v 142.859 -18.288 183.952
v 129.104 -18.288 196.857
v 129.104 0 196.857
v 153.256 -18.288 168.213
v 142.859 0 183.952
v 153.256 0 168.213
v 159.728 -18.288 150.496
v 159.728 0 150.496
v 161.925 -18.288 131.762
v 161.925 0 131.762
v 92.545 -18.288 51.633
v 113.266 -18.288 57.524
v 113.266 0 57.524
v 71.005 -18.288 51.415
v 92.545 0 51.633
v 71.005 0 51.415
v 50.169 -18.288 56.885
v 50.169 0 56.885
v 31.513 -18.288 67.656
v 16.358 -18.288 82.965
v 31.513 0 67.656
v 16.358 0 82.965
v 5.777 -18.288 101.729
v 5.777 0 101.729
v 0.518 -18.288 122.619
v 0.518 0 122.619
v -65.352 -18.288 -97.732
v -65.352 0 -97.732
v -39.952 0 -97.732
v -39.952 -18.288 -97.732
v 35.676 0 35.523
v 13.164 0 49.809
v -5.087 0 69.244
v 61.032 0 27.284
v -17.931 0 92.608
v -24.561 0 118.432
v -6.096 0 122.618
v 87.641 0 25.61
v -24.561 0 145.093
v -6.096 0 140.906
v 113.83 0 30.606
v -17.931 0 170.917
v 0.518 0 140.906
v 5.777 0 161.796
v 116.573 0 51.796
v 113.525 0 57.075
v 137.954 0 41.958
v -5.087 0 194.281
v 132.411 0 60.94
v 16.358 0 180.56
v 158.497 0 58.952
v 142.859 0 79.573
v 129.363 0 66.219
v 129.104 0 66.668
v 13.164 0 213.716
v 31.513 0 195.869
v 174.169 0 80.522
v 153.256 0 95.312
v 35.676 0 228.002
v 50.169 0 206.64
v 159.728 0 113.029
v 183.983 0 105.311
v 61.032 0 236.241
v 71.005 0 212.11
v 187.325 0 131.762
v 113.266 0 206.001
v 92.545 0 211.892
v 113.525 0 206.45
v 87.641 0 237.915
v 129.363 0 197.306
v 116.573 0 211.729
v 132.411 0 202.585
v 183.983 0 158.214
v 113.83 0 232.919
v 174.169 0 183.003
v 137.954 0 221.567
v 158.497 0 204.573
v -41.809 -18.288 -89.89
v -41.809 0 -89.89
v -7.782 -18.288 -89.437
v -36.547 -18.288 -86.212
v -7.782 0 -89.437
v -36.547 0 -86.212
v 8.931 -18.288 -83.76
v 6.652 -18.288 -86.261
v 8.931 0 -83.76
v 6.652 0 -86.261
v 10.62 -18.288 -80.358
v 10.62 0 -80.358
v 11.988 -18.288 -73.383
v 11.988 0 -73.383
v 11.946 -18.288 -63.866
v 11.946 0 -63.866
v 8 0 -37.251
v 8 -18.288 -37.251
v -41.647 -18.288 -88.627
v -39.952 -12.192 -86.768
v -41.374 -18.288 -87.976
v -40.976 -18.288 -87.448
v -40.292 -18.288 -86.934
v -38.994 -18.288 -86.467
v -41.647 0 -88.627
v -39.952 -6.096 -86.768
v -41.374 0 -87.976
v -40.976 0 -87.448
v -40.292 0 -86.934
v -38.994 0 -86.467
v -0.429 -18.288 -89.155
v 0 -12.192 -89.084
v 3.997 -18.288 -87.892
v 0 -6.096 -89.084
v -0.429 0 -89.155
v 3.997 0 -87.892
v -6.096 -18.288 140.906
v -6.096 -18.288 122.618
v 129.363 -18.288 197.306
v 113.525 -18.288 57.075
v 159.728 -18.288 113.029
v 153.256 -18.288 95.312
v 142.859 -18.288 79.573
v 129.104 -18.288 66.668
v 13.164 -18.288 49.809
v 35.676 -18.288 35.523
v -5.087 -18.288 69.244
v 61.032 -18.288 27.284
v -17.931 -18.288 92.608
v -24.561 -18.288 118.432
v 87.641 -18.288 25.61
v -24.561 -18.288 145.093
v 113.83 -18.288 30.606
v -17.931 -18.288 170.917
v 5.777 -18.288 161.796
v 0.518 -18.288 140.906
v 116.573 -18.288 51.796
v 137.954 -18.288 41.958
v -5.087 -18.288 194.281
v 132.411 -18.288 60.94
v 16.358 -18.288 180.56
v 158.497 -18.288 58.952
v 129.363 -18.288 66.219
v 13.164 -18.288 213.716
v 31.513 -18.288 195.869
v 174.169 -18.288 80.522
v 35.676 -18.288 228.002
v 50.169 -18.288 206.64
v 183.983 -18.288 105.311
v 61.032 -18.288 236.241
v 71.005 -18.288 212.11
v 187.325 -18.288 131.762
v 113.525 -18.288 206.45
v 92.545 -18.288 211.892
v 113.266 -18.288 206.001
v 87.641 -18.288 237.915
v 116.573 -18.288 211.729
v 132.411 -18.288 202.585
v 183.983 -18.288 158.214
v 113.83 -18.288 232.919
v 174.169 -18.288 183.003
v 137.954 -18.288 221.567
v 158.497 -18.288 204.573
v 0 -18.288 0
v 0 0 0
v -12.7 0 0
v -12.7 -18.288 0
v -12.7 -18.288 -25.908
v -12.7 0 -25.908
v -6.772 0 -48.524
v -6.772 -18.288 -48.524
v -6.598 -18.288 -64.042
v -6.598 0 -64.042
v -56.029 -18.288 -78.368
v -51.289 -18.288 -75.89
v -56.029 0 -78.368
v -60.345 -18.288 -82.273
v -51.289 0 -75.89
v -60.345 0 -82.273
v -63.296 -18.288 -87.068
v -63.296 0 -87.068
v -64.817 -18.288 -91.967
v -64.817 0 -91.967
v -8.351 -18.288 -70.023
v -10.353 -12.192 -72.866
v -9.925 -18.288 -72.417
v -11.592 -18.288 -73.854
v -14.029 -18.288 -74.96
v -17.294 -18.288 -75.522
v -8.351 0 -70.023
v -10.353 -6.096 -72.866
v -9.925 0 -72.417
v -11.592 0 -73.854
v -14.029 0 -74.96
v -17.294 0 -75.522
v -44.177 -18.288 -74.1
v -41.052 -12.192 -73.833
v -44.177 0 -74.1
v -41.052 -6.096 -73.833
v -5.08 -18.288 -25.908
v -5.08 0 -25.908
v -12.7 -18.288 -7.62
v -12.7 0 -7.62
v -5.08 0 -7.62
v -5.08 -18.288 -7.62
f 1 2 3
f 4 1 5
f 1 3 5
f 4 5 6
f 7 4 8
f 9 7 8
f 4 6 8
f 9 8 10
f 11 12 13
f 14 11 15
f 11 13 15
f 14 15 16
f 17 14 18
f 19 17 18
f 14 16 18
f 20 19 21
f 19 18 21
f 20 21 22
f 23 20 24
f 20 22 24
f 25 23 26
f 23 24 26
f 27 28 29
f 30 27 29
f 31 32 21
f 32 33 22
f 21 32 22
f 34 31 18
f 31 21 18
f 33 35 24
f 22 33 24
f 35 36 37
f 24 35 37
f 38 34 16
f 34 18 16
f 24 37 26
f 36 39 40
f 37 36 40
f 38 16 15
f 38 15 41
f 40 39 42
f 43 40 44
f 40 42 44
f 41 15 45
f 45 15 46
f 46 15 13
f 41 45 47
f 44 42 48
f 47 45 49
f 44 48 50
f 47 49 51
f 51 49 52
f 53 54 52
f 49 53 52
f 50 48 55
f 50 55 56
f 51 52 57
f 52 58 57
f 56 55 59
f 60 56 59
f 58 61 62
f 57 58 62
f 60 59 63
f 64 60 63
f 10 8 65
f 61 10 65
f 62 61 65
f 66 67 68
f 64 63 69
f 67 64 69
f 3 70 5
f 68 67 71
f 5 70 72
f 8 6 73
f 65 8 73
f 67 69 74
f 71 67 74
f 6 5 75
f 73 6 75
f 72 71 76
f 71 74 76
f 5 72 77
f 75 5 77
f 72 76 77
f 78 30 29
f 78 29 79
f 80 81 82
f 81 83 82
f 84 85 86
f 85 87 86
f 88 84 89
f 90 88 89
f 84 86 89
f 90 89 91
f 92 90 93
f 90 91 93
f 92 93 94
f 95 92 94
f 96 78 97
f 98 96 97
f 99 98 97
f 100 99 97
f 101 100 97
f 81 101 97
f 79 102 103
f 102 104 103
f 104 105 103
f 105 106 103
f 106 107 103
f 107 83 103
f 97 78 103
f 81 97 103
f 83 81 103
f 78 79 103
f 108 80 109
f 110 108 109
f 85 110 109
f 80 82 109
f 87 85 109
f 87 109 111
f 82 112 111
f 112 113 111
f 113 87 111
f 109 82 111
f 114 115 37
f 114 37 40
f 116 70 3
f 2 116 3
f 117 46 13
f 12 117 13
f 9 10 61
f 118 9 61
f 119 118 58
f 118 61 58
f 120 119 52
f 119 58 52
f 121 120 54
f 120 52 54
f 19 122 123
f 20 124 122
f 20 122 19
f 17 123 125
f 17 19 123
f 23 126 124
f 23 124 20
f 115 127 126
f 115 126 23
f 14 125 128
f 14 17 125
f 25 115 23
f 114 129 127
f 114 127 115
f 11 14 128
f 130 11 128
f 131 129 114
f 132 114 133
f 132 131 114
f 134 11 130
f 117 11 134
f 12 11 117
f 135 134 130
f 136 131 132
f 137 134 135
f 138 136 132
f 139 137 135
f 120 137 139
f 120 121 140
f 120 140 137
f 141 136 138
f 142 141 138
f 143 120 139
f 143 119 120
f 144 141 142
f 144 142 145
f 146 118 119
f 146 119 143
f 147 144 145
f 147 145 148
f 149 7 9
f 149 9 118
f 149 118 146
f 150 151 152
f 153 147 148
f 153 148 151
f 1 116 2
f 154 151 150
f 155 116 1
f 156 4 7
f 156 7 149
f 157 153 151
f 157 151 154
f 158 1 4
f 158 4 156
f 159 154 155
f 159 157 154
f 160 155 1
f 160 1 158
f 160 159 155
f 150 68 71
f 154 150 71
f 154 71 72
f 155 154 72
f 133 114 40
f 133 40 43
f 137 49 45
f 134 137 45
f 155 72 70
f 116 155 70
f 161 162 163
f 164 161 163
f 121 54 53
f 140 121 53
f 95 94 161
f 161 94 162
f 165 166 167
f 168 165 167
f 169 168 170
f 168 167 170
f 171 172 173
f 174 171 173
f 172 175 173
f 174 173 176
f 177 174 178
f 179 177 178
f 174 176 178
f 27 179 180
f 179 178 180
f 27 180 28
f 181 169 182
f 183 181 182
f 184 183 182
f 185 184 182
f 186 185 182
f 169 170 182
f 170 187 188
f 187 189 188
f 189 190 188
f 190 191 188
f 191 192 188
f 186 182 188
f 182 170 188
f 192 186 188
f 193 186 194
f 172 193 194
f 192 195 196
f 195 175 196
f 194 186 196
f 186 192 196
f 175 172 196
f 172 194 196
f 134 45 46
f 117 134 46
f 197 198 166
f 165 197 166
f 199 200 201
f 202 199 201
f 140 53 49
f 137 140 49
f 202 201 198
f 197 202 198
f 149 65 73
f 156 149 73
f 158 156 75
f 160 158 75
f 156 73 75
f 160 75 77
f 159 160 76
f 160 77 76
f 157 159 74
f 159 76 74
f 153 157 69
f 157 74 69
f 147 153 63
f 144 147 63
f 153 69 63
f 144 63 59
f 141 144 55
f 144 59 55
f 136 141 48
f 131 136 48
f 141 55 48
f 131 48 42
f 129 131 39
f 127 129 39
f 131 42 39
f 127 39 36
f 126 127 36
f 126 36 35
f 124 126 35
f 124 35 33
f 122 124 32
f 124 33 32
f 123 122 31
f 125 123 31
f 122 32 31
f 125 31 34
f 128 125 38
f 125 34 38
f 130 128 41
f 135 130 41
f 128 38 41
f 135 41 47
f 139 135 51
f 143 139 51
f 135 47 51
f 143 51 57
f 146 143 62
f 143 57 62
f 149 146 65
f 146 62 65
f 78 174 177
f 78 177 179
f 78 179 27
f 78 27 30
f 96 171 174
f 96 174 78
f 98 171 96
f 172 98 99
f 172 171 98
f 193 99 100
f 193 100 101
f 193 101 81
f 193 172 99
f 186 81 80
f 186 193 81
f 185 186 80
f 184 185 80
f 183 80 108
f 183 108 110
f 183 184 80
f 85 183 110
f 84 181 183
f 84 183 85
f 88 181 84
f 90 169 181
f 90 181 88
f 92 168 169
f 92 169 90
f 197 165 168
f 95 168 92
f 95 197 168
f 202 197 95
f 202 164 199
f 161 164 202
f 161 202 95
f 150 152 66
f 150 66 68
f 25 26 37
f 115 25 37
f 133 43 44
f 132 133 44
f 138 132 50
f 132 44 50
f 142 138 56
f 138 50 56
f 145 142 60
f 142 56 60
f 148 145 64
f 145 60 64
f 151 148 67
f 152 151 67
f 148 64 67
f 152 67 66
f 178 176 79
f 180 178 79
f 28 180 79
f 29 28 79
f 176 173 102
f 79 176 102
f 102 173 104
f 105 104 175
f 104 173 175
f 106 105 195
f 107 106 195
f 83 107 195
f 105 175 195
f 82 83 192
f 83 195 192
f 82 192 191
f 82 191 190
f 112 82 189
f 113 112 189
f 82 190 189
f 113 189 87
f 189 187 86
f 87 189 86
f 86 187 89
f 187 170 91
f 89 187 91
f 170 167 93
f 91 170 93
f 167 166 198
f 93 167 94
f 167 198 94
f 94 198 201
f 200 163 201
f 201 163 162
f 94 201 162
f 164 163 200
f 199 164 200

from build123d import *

# Parameters (mm, degrees)
F0_R     = 106.3625
F1_DEPTH = 18.288


with BuildPart() as f1:
    # F0 (on Front) → F1 (new body)
    with BuildSketch(Plane.XZ):
        with Locations((80.9625, 131.7625)):
            Circle(F0_R)
        with BuildLine():
            ThreePointArc((129.103674141, 196.8574595482), (153.255501797, 168.2131282172), (161.925, 131.7625))
            ThreePointArc((161.925, 131.7625), (153.255501797, 95.3118717828), (129.103674141, 66.6675404518))
            Line((129.103674141, 66.6675404518), (129.3626862922, 66.2189182461))
            Line((129.3626862922, 66.2189182461), (132.4106862922, 60.9396273846))
            Line((132.4106862922, 60.9396273846), (116.5728137078, 51.7956273846))
            Line((116.5728137078, 51.7956273846), (113.5248137078, 57.0749182461))
            Line((113.5248137078, 57.0749182461), (113.2658015566, 57.5235404518))
            ThreePointArc((113.2658015566, 57.5235404518), (40.48125, 61.6469182461), (0.5180243025, 122.6185))
            Line((0.5180243025, 122.6185), (0, 122.6185))
            Line((0, 122.6185), (-6.096, 122.6185))
            Line((-6.096, 122.6185), (-6.096, 140.9065))
            Line((-6.096, 140.9065), (0, 140.9065))
            Line((0, 140.9065), (0.5180243025, 140.9065))
            ThreePointArc((0.5180243025, 140.9065), (40.48125, 201.8780817539), (113.2658015566, 206.0014595482))
            Line((113.2658015566, 206.0014595482), (113.5248137078, 206.4500817539))
            Line((113.5248137078, 206.4500817539), (116.5728137078, 211.7293726154))
            Line((116.5728137078, 211.7293726154), (132.4106862922, 202.5853726154))
            Line((132.4106862922, 202.5853726154), (129.3626862922, 197.3060817539))
            Line((129.3626862922, 197.3060817539), (129.103674141, 196.8574595482))
        make_face(mode=Mode.SUBTRACT)
    extrude(amount=F1_DEPTH)


with BuildPart() as f1b:
    # F0 (on Front) → F1, piece 2 (new body)
    with BuildSketch(Plane.XZ):
        with BuildLine():
            Line((8, -37.2506375784), (0, 0))
            Line((0, 0), (-12.7, 0))
            Line((-12.7, 0), (-12.7, -7.62))
            Line((-12.7, -7.62), (-5.08, -7.62))
            Line((-5.08, -7.62), (-5.08, -25.908))
            Line((-5.08, -25.908), (-12.7, -25.908))
            add(Edge.make_bspline(
                [(-12.7, -25.908), (-6.2093237592, -41.651973211), (-0.4423801748, -85.1890591451), (-42.5650752415, -67.7560872407), (-65.3522448846, -81.3096976825), (-65.3522448846, -97.7317927159)],
                knots=[0, 0, 0, 0, 0.3759879974, 0.6798769586, 1, 1, 1, 1], degree=3))
            Line((-65.3522448846, -97.7317927159), (-39.9522448846, -97.7317927159))
            add(Edge.make_bspline(
                [(-39.9522448846, -97.7317927159), (-41.7322214385, -92.0158930577), (-45.5375410956, -80.5929521895), (13.0032108044, -99.1822132587), (14.8568050724, -72.310776957), (8, -37.2506375784)],
                knots=[0, 0, 0, 0, 0.1961686038, 0.5709524025, 1, 1, 1, 1], degree=3))
        make_face()
    extrude(amount=F1_DEPTH)


solid = Compound([f1.part, f1b.part])
